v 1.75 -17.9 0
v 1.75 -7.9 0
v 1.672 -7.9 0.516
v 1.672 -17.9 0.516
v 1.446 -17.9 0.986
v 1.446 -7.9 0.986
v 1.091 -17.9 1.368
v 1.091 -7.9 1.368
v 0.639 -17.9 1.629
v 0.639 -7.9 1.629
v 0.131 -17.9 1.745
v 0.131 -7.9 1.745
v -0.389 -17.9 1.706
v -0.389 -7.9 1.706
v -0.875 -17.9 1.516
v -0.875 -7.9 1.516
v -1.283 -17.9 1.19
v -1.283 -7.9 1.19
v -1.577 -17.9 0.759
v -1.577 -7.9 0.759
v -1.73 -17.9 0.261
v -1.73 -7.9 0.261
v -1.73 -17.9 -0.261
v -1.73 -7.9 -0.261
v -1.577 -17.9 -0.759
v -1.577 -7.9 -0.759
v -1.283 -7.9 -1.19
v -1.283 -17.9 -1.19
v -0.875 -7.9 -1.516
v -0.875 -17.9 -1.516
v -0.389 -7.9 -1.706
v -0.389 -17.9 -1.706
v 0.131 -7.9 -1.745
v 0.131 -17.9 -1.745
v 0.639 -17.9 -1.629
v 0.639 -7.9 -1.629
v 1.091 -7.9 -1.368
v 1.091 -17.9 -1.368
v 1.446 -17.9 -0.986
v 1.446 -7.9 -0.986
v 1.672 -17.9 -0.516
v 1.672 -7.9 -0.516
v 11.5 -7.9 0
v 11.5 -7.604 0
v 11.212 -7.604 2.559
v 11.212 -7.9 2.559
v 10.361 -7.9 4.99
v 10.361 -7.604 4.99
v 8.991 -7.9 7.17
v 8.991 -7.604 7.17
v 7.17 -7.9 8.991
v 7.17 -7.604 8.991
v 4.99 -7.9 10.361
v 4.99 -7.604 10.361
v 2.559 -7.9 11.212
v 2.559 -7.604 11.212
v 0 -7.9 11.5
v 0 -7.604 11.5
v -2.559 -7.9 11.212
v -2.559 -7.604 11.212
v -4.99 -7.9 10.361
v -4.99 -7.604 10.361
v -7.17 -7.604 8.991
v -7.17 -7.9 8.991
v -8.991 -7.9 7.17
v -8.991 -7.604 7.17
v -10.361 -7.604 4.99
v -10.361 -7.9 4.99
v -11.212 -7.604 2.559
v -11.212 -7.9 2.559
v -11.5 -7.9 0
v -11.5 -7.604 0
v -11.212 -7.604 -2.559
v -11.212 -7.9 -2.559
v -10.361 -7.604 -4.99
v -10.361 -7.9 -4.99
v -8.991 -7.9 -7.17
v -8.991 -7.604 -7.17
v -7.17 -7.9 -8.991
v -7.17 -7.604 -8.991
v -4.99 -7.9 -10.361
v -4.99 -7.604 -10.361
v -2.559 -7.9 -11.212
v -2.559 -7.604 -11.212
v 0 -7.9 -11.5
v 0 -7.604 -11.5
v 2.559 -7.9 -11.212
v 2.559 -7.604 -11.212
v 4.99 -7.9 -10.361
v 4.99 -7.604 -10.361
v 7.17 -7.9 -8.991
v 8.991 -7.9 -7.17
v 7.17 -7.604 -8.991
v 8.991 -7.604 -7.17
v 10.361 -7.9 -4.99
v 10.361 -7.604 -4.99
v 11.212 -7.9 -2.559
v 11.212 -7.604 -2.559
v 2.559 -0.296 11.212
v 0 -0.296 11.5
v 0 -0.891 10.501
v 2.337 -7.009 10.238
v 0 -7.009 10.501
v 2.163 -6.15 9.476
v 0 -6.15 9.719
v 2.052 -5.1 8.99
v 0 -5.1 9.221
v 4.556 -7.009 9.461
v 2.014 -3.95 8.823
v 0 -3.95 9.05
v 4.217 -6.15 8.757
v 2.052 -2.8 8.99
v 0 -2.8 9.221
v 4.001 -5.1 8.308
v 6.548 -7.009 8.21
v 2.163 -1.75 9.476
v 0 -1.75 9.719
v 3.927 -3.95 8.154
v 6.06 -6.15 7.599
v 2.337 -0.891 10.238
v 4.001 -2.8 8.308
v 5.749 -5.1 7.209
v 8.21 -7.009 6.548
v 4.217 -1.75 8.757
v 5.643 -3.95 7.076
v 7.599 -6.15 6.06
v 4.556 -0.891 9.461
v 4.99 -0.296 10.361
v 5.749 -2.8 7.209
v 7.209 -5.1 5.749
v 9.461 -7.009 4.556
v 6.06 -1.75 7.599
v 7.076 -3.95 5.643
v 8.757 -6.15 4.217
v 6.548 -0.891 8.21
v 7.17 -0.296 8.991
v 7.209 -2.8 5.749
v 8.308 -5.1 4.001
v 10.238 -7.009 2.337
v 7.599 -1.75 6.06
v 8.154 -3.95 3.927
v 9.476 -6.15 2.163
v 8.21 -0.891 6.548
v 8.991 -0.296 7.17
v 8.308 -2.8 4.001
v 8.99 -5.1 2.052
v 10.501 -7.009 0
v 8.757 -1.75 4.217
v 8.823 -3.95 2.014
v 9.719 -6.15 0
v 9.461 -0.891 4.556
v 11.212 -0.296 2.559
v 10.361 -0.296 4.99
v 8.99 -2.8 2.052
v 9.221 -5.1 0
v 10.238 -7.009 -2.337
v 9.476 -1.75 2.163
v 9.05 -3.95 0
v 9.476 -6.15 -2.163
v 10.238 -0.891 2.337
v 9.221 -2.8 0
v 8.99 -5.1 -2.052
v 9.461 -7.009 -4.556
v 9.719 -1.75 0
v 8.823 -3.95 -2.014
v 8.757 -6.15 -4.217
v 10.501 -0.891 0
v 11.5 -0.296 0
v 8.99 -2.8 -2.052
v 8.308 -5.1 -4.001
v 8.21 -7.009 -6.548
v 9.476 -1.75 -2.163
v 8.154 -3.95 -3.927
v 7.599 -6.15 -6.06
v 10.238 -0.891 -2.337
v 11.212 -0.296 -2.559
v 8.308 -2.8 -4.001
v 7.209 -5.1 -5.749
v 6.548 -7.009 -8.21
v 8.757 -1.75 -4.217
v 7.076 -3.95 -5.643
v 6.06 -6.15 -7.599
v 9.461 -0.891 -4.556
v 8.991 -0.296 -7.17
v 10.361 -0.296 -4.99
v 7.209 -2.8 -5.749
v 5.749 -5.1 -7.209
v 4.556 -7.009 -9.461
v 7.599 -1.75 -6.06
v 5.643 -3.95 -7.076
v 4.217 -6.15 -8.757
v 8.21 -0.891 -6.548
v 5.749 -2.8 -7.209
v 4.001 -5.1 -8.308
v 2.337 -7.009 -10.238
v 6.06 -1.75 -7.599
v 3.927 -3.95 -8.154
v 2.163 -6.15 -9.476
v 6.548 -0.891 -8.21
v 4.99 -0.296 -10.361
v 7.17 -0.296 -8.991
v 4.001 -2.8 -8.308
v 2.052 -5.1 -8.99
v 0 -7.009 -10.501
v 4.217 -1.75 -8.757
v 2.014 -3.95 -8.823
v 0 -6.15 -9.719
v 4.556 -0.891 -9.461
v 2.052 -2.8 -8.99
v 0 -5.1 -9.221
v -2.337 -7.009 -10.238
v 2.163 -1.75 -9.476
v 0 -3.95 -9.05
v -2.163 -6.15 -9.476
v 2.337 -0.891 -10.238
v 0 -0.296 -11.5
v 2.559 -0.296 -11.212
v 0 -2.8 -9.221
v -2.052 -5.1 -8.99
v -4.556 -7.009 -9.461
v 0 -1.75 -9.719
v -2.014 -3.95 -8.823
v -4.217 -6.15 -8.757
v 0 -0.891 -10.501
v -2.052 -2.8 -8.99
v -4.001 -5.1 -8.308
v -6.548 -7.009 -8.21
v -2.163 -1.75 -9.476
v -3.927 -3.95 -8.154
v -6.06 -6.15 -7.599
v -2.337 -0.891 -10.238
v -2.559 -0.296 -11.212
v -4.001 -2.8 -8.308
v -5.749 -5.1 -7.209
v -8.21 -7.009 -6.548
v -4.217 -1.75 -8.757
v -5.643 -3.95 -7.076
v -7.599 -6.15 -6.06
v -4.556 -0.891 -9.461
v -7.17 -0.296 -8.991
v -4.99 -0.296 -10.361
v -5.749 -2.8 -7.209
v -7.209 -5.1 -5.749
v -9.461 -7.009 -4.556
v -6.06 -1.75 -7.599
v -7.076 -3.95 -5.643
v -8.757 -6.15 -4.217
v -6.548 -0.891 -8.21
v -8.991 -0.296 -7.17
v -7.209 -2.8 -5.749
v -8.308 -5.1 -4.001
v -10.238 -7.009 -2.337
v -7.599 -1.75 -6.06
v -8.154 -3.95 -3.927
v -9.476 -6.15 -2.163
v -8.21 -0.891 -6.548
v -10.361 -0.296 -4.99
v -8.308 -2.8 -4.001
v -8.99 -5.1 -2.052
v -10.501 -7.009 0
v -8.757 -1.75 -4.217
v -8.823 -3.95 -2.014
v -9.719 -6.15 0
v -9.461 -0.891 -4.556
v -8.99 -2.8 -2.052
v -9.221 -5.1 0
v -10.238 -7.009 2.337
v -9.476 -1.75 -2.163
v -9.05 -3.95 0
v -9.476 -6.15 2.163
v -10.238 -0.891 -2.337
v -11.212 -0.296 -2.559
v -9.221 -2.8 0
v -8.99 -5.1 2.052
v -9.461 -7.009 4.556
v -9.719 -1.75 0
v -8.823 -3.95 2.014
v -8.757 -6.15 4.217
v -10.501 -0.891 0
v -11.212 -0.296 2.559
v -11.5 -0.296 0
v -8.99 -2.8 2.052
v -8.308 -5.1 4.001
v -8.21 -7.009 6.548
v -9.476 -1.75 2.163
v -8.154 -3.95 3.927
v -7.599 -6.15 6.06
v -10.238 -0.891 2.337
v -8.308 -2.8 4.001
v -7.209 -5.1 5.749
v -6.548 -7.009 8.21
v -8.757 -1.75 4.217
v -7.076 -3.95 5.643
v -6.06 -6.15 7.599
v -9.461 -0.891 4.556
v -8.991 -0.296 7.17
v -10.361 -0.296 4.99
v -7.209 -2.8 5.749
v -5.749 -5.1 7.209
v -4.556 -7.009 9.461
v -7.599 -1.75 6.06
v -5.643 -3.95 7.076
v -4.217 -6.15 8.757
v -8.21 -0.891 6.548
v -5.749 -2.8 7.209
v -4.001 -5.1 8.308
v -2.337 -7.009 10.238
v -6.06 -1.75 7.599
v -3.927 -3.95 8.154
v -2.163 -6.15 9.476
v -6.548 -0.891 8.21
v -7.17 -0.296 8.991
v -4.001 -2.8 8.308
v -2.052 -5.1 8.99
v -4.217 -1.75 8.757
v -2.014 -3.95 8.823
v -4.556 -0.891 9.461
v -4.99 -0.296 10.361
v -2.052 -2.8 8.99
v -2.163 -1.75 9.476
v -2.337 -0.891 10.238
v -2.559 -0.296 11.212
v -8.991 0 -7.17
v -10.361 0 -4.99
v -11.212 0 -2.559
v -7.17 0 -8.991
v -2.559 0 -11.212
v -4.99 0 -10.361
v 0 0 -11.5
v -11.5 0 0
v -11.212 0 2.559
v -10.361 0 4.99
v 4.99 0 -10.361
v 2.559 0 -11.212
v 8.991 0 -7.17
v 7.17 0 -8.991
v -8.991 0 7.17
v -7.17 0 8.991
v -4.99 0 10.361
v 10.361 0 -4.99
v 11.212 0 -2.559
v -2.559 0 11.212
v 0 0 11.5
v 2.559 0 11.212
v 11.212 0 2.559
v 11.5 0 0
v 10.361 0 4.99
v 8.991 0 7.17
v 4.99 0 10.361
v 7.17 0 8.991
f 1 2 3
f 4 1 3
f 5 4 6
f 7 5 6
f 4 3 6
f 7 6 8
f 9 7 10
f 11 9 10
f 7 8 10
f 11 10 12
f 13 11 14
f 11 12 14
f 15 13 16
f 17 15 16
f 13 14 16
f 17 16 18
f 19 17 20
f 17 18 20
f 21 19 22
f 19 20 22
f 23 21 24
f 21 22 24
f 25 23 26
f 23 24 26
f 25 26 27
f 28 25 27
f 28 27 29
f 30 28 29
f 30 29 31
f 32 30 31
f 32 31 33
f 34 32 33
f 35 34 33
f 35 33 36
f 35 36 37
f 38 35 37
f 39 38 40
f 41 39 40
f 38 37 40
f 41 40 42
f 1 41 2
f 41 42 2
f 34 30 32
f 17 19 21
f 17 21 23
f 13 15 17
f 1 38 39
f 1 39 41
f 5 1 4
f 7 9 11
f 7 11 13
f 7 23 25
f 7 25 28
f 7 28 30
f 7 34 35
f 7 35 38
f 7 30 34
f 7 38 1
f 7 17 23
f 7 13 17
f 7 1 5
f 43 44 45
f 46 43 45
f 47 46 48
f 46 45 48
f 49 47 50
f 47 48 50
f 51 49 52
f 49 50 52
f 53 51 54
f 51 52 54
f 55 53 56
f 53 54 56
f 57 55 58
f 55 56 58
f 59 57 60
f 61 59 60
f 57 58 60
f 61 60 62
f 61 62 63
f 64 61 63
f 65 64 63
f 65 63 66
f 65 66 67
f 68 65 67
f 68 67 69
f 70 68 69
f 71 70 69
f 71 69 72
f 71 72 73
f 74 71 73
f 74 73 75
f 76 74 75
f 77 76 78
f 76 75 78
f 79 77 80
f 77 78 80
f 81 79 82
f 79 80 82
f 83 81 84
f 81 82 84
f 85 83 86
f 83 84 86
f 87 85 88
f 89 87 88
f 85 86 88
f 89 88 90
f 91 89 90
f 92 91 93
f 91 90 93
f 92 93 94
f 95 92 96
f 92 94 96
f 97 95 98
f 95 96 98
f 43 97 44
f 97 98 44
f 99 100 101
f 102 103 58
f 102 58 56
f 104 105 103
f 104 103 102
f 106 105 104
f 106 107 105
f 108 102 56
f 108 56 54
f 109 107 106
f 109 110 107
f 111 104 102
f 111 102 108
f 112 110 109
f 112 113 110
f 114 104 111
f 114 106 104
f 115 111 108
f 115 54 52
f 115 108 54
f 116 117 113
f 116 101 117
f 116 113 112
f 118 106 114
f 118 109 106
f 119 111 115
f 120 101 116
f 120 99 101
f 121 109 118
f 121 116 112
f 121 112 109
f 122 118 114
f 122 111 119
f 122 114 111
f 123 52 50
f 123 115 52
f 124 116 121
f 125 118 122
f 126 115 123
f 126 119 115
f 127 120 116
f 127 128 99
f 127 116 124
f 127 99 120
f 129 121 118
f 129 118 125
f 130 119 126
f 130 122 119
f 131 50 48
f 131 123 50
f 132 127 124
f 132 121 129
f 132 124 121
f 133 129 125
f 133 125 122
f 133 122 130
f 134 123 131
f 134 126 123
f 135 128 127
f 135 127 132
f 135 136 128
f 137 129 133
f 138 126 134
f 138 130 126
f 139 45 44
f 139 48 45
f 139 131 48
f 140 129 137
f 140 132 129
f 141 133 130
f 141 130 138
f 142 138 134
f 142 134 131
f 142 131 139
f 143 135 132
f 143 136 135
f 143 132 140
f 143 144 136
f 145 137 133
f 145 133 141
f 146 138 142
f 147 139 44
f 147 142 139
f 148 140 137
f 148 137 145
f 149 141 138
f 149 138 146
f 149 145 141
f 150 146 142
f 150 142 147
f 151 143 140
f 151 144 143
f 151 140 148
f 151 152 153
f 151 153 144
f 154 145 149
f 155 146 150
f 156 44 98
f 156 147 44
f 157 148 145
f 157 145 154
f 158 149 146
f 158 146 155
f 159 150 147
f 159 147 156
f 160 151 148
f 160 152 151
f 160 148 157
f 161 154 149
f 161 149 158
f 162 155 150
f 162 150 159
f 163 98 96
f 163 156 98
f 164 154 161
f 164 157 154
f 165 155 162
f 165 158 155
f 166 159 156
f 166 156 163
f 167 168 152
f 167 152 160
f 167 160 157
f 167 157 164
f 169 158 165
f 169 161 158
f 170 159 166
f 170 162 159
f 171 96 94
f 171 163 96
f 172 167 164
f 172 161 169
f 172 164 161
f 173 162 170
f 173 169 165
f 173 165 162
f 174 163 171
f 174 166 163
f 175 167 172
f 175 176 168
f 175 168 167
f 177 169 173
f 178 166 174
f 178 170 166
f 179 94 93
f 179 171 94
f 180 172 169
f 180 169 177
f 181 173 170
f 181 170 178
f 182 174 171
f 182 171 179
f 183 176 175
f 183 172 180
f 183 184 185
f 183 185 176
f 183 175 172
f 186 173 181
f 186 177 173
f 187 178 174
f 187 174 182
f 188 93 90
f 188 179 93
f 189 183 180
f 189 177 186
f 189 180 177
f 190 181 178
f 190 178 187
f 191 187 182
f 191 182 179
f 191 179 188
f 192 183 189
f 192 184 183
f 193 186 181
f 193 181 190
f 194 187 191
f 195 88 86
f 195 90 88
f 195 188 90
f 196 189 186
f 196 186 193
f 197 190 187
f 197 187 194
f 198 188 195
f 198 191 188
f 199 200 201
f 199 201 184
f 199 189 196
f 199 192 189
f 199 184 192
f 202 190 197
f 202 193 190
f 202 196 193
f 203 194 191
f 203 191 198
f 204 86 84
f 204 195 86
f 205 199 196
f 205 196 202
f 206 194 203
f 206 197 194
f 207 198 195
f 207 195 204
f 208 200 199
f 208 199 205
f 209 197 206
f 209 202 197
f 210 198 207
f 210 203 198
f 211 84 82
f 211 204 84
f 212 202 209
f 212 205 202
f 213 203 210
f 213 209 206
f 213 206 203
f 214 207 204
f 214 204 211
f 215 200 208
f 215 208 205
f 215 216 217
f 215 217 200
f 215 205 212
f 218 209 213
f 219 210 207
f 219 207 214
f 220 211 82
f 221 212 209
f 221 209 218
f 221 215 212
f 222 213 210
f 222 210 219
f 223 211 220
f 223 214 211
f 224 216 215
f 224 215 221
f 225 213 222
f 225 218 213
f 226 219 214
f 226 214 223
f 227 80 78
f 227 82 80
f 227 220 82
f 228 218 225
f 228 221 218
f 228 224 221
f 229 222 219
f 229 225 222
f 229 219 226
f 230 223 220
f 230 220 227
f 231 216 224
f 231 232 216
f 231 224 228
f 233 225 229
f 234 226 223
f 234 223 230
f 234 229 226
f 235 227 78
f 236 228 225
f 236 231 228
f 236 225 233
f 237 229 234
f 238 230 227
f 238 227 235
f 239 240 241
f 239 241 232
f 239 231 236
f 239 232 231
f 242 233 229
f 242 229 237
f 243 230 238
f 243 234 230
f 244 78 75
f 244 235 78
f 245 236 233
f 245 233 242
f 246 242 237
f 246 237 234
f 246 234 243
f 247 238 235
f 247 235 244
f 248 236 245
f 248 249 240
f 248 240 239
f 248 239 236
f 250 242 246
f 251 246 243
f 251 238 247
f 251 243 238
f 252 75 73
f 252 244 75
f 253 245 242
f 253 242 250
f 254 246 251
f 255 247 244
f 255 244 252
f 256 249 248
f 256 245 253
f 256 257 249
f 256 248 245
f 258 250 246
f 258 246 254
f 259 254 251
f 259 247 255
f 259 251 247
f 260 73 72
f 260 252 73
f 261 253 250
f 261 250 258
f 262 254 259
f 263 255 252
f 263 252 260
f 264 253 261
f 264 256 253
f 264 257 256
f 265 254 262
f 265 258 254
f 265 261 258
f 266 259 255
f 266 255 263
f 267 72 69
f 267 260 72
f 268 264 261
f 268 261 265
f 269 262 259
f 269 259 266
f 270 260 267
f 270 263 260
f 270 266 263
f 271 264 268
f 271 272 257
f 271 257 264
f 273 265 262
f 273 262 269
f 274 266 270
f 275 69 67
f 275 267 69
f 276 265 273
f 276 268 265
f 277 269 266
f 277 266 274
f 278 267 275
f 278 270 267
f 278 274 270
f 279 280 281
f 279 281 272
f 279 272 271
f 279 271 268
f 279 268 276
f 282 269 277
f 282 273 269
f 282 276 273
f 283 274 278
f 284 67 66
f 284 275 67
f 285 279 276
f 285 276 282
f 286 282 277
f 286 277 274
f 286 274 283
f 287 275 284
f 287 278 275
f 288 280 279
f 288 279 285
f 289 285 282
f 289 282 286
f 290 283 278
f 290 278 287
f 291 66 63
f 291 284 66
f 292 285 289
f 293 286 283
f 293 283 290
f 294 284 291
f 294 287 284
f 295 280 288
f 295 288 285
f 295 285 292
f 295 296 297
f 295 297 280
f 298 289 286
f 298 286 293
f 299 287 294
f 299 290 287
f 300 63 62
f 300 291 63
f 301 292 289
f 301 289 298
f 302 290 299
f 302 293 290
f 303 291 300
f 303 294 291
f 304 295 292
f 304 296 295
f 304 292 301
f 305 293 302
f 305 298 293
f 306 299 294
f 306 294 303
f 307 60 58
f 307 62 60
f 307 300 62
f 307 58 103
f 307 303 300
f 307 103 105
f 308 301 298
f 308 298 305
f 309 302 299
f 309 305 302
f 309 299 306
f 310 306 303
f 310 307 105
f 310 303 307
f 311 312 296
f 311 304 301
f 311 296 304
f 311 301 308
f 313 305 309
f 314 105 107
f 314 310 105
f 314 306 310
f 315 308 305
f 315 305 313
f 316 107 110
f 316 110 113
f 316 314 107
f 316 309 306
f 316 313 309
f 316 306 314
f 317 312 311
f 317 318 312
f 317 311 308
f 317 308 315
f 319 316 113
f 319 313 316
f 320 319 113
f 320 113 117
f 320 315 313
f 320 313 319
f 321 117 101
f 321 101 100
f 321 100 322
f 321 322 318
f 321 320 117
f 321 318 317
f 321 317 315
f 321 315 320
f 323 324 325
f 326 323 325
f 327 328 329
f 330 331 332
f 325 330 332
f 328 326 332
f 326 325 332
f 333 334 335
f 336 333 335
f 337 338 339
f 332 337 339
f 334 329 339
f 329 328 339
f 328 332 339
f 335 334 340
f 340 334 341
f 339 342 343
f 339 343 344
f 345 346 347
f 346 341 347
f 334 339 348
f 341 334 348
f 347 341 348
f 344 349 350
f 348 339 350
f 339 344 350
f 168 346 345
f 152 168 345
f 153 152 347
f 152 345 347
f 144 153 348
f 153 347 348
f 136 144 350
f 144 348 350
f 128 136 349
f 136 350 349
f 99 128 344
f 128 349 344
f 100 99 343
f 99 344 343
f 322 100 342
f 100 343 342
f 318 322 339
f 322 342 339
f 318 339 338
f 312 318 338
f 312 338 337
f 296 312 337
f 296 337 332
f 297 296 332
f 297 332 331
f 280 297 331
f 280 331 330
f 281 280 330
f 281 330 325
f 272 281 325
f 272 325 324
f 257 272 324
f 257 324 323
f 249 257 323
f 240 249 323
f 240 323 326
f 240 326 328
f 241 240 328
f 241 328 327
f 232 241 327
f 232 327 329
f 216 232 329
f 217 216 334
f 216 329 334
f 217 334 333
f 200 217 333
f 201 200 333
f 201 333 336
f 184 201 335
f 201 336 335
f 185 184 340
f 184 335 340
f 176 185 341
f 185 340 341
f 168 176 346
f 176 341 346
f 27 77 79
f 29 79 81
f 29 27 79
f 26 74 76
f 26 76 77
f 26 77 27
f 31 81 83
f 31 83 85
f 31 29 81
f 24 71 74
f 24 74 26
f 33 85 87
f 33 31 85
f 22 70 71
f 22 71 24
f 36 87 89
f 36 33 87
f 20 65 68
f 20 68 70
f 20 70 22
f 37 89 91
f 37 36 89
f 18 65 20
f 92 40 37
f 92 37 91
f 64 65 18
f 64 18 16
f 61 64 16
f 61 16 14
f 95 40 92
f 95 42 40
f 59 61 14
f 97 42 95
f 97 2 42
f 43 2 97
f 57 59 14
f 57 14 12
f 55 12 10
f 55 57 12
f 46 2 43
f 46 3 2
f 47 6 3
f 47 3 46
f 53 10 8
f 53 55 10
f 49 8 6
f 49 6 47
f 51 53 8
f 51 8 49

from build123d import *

# Parameters (mm, degrees)
F0_R     = 11.5
F1_DEPTH = 7.9
F2_R     = 1.75
F3_DEPTH = 10
F4_R     = 3.95


with BuildPart() as f1:
    # F0 (on Front) → F1 (new body)
    with BuildSketch(Plane.XZ):
        Circle(F0_R)
    extrude(amount=F1_DEPTH)

    # F2 (on face) → F3 (join)
    with BuildSketch(Plane.XZ.offset(7.9)):
        Circle(F2_R)
    extrude(amount=F3_DEPTH)

    # F4 (on Right) → F5 (revolve, cut)
    with BuildSketch(Plane.YZ):
        with Locations((-3.95, 13)):
            Circle(F4_R)
    revolve(axis=Axis((0, -5.14938, 0), (0, 1, 0)), mode=Mode.SUBTRACT)


solid = f1.part
